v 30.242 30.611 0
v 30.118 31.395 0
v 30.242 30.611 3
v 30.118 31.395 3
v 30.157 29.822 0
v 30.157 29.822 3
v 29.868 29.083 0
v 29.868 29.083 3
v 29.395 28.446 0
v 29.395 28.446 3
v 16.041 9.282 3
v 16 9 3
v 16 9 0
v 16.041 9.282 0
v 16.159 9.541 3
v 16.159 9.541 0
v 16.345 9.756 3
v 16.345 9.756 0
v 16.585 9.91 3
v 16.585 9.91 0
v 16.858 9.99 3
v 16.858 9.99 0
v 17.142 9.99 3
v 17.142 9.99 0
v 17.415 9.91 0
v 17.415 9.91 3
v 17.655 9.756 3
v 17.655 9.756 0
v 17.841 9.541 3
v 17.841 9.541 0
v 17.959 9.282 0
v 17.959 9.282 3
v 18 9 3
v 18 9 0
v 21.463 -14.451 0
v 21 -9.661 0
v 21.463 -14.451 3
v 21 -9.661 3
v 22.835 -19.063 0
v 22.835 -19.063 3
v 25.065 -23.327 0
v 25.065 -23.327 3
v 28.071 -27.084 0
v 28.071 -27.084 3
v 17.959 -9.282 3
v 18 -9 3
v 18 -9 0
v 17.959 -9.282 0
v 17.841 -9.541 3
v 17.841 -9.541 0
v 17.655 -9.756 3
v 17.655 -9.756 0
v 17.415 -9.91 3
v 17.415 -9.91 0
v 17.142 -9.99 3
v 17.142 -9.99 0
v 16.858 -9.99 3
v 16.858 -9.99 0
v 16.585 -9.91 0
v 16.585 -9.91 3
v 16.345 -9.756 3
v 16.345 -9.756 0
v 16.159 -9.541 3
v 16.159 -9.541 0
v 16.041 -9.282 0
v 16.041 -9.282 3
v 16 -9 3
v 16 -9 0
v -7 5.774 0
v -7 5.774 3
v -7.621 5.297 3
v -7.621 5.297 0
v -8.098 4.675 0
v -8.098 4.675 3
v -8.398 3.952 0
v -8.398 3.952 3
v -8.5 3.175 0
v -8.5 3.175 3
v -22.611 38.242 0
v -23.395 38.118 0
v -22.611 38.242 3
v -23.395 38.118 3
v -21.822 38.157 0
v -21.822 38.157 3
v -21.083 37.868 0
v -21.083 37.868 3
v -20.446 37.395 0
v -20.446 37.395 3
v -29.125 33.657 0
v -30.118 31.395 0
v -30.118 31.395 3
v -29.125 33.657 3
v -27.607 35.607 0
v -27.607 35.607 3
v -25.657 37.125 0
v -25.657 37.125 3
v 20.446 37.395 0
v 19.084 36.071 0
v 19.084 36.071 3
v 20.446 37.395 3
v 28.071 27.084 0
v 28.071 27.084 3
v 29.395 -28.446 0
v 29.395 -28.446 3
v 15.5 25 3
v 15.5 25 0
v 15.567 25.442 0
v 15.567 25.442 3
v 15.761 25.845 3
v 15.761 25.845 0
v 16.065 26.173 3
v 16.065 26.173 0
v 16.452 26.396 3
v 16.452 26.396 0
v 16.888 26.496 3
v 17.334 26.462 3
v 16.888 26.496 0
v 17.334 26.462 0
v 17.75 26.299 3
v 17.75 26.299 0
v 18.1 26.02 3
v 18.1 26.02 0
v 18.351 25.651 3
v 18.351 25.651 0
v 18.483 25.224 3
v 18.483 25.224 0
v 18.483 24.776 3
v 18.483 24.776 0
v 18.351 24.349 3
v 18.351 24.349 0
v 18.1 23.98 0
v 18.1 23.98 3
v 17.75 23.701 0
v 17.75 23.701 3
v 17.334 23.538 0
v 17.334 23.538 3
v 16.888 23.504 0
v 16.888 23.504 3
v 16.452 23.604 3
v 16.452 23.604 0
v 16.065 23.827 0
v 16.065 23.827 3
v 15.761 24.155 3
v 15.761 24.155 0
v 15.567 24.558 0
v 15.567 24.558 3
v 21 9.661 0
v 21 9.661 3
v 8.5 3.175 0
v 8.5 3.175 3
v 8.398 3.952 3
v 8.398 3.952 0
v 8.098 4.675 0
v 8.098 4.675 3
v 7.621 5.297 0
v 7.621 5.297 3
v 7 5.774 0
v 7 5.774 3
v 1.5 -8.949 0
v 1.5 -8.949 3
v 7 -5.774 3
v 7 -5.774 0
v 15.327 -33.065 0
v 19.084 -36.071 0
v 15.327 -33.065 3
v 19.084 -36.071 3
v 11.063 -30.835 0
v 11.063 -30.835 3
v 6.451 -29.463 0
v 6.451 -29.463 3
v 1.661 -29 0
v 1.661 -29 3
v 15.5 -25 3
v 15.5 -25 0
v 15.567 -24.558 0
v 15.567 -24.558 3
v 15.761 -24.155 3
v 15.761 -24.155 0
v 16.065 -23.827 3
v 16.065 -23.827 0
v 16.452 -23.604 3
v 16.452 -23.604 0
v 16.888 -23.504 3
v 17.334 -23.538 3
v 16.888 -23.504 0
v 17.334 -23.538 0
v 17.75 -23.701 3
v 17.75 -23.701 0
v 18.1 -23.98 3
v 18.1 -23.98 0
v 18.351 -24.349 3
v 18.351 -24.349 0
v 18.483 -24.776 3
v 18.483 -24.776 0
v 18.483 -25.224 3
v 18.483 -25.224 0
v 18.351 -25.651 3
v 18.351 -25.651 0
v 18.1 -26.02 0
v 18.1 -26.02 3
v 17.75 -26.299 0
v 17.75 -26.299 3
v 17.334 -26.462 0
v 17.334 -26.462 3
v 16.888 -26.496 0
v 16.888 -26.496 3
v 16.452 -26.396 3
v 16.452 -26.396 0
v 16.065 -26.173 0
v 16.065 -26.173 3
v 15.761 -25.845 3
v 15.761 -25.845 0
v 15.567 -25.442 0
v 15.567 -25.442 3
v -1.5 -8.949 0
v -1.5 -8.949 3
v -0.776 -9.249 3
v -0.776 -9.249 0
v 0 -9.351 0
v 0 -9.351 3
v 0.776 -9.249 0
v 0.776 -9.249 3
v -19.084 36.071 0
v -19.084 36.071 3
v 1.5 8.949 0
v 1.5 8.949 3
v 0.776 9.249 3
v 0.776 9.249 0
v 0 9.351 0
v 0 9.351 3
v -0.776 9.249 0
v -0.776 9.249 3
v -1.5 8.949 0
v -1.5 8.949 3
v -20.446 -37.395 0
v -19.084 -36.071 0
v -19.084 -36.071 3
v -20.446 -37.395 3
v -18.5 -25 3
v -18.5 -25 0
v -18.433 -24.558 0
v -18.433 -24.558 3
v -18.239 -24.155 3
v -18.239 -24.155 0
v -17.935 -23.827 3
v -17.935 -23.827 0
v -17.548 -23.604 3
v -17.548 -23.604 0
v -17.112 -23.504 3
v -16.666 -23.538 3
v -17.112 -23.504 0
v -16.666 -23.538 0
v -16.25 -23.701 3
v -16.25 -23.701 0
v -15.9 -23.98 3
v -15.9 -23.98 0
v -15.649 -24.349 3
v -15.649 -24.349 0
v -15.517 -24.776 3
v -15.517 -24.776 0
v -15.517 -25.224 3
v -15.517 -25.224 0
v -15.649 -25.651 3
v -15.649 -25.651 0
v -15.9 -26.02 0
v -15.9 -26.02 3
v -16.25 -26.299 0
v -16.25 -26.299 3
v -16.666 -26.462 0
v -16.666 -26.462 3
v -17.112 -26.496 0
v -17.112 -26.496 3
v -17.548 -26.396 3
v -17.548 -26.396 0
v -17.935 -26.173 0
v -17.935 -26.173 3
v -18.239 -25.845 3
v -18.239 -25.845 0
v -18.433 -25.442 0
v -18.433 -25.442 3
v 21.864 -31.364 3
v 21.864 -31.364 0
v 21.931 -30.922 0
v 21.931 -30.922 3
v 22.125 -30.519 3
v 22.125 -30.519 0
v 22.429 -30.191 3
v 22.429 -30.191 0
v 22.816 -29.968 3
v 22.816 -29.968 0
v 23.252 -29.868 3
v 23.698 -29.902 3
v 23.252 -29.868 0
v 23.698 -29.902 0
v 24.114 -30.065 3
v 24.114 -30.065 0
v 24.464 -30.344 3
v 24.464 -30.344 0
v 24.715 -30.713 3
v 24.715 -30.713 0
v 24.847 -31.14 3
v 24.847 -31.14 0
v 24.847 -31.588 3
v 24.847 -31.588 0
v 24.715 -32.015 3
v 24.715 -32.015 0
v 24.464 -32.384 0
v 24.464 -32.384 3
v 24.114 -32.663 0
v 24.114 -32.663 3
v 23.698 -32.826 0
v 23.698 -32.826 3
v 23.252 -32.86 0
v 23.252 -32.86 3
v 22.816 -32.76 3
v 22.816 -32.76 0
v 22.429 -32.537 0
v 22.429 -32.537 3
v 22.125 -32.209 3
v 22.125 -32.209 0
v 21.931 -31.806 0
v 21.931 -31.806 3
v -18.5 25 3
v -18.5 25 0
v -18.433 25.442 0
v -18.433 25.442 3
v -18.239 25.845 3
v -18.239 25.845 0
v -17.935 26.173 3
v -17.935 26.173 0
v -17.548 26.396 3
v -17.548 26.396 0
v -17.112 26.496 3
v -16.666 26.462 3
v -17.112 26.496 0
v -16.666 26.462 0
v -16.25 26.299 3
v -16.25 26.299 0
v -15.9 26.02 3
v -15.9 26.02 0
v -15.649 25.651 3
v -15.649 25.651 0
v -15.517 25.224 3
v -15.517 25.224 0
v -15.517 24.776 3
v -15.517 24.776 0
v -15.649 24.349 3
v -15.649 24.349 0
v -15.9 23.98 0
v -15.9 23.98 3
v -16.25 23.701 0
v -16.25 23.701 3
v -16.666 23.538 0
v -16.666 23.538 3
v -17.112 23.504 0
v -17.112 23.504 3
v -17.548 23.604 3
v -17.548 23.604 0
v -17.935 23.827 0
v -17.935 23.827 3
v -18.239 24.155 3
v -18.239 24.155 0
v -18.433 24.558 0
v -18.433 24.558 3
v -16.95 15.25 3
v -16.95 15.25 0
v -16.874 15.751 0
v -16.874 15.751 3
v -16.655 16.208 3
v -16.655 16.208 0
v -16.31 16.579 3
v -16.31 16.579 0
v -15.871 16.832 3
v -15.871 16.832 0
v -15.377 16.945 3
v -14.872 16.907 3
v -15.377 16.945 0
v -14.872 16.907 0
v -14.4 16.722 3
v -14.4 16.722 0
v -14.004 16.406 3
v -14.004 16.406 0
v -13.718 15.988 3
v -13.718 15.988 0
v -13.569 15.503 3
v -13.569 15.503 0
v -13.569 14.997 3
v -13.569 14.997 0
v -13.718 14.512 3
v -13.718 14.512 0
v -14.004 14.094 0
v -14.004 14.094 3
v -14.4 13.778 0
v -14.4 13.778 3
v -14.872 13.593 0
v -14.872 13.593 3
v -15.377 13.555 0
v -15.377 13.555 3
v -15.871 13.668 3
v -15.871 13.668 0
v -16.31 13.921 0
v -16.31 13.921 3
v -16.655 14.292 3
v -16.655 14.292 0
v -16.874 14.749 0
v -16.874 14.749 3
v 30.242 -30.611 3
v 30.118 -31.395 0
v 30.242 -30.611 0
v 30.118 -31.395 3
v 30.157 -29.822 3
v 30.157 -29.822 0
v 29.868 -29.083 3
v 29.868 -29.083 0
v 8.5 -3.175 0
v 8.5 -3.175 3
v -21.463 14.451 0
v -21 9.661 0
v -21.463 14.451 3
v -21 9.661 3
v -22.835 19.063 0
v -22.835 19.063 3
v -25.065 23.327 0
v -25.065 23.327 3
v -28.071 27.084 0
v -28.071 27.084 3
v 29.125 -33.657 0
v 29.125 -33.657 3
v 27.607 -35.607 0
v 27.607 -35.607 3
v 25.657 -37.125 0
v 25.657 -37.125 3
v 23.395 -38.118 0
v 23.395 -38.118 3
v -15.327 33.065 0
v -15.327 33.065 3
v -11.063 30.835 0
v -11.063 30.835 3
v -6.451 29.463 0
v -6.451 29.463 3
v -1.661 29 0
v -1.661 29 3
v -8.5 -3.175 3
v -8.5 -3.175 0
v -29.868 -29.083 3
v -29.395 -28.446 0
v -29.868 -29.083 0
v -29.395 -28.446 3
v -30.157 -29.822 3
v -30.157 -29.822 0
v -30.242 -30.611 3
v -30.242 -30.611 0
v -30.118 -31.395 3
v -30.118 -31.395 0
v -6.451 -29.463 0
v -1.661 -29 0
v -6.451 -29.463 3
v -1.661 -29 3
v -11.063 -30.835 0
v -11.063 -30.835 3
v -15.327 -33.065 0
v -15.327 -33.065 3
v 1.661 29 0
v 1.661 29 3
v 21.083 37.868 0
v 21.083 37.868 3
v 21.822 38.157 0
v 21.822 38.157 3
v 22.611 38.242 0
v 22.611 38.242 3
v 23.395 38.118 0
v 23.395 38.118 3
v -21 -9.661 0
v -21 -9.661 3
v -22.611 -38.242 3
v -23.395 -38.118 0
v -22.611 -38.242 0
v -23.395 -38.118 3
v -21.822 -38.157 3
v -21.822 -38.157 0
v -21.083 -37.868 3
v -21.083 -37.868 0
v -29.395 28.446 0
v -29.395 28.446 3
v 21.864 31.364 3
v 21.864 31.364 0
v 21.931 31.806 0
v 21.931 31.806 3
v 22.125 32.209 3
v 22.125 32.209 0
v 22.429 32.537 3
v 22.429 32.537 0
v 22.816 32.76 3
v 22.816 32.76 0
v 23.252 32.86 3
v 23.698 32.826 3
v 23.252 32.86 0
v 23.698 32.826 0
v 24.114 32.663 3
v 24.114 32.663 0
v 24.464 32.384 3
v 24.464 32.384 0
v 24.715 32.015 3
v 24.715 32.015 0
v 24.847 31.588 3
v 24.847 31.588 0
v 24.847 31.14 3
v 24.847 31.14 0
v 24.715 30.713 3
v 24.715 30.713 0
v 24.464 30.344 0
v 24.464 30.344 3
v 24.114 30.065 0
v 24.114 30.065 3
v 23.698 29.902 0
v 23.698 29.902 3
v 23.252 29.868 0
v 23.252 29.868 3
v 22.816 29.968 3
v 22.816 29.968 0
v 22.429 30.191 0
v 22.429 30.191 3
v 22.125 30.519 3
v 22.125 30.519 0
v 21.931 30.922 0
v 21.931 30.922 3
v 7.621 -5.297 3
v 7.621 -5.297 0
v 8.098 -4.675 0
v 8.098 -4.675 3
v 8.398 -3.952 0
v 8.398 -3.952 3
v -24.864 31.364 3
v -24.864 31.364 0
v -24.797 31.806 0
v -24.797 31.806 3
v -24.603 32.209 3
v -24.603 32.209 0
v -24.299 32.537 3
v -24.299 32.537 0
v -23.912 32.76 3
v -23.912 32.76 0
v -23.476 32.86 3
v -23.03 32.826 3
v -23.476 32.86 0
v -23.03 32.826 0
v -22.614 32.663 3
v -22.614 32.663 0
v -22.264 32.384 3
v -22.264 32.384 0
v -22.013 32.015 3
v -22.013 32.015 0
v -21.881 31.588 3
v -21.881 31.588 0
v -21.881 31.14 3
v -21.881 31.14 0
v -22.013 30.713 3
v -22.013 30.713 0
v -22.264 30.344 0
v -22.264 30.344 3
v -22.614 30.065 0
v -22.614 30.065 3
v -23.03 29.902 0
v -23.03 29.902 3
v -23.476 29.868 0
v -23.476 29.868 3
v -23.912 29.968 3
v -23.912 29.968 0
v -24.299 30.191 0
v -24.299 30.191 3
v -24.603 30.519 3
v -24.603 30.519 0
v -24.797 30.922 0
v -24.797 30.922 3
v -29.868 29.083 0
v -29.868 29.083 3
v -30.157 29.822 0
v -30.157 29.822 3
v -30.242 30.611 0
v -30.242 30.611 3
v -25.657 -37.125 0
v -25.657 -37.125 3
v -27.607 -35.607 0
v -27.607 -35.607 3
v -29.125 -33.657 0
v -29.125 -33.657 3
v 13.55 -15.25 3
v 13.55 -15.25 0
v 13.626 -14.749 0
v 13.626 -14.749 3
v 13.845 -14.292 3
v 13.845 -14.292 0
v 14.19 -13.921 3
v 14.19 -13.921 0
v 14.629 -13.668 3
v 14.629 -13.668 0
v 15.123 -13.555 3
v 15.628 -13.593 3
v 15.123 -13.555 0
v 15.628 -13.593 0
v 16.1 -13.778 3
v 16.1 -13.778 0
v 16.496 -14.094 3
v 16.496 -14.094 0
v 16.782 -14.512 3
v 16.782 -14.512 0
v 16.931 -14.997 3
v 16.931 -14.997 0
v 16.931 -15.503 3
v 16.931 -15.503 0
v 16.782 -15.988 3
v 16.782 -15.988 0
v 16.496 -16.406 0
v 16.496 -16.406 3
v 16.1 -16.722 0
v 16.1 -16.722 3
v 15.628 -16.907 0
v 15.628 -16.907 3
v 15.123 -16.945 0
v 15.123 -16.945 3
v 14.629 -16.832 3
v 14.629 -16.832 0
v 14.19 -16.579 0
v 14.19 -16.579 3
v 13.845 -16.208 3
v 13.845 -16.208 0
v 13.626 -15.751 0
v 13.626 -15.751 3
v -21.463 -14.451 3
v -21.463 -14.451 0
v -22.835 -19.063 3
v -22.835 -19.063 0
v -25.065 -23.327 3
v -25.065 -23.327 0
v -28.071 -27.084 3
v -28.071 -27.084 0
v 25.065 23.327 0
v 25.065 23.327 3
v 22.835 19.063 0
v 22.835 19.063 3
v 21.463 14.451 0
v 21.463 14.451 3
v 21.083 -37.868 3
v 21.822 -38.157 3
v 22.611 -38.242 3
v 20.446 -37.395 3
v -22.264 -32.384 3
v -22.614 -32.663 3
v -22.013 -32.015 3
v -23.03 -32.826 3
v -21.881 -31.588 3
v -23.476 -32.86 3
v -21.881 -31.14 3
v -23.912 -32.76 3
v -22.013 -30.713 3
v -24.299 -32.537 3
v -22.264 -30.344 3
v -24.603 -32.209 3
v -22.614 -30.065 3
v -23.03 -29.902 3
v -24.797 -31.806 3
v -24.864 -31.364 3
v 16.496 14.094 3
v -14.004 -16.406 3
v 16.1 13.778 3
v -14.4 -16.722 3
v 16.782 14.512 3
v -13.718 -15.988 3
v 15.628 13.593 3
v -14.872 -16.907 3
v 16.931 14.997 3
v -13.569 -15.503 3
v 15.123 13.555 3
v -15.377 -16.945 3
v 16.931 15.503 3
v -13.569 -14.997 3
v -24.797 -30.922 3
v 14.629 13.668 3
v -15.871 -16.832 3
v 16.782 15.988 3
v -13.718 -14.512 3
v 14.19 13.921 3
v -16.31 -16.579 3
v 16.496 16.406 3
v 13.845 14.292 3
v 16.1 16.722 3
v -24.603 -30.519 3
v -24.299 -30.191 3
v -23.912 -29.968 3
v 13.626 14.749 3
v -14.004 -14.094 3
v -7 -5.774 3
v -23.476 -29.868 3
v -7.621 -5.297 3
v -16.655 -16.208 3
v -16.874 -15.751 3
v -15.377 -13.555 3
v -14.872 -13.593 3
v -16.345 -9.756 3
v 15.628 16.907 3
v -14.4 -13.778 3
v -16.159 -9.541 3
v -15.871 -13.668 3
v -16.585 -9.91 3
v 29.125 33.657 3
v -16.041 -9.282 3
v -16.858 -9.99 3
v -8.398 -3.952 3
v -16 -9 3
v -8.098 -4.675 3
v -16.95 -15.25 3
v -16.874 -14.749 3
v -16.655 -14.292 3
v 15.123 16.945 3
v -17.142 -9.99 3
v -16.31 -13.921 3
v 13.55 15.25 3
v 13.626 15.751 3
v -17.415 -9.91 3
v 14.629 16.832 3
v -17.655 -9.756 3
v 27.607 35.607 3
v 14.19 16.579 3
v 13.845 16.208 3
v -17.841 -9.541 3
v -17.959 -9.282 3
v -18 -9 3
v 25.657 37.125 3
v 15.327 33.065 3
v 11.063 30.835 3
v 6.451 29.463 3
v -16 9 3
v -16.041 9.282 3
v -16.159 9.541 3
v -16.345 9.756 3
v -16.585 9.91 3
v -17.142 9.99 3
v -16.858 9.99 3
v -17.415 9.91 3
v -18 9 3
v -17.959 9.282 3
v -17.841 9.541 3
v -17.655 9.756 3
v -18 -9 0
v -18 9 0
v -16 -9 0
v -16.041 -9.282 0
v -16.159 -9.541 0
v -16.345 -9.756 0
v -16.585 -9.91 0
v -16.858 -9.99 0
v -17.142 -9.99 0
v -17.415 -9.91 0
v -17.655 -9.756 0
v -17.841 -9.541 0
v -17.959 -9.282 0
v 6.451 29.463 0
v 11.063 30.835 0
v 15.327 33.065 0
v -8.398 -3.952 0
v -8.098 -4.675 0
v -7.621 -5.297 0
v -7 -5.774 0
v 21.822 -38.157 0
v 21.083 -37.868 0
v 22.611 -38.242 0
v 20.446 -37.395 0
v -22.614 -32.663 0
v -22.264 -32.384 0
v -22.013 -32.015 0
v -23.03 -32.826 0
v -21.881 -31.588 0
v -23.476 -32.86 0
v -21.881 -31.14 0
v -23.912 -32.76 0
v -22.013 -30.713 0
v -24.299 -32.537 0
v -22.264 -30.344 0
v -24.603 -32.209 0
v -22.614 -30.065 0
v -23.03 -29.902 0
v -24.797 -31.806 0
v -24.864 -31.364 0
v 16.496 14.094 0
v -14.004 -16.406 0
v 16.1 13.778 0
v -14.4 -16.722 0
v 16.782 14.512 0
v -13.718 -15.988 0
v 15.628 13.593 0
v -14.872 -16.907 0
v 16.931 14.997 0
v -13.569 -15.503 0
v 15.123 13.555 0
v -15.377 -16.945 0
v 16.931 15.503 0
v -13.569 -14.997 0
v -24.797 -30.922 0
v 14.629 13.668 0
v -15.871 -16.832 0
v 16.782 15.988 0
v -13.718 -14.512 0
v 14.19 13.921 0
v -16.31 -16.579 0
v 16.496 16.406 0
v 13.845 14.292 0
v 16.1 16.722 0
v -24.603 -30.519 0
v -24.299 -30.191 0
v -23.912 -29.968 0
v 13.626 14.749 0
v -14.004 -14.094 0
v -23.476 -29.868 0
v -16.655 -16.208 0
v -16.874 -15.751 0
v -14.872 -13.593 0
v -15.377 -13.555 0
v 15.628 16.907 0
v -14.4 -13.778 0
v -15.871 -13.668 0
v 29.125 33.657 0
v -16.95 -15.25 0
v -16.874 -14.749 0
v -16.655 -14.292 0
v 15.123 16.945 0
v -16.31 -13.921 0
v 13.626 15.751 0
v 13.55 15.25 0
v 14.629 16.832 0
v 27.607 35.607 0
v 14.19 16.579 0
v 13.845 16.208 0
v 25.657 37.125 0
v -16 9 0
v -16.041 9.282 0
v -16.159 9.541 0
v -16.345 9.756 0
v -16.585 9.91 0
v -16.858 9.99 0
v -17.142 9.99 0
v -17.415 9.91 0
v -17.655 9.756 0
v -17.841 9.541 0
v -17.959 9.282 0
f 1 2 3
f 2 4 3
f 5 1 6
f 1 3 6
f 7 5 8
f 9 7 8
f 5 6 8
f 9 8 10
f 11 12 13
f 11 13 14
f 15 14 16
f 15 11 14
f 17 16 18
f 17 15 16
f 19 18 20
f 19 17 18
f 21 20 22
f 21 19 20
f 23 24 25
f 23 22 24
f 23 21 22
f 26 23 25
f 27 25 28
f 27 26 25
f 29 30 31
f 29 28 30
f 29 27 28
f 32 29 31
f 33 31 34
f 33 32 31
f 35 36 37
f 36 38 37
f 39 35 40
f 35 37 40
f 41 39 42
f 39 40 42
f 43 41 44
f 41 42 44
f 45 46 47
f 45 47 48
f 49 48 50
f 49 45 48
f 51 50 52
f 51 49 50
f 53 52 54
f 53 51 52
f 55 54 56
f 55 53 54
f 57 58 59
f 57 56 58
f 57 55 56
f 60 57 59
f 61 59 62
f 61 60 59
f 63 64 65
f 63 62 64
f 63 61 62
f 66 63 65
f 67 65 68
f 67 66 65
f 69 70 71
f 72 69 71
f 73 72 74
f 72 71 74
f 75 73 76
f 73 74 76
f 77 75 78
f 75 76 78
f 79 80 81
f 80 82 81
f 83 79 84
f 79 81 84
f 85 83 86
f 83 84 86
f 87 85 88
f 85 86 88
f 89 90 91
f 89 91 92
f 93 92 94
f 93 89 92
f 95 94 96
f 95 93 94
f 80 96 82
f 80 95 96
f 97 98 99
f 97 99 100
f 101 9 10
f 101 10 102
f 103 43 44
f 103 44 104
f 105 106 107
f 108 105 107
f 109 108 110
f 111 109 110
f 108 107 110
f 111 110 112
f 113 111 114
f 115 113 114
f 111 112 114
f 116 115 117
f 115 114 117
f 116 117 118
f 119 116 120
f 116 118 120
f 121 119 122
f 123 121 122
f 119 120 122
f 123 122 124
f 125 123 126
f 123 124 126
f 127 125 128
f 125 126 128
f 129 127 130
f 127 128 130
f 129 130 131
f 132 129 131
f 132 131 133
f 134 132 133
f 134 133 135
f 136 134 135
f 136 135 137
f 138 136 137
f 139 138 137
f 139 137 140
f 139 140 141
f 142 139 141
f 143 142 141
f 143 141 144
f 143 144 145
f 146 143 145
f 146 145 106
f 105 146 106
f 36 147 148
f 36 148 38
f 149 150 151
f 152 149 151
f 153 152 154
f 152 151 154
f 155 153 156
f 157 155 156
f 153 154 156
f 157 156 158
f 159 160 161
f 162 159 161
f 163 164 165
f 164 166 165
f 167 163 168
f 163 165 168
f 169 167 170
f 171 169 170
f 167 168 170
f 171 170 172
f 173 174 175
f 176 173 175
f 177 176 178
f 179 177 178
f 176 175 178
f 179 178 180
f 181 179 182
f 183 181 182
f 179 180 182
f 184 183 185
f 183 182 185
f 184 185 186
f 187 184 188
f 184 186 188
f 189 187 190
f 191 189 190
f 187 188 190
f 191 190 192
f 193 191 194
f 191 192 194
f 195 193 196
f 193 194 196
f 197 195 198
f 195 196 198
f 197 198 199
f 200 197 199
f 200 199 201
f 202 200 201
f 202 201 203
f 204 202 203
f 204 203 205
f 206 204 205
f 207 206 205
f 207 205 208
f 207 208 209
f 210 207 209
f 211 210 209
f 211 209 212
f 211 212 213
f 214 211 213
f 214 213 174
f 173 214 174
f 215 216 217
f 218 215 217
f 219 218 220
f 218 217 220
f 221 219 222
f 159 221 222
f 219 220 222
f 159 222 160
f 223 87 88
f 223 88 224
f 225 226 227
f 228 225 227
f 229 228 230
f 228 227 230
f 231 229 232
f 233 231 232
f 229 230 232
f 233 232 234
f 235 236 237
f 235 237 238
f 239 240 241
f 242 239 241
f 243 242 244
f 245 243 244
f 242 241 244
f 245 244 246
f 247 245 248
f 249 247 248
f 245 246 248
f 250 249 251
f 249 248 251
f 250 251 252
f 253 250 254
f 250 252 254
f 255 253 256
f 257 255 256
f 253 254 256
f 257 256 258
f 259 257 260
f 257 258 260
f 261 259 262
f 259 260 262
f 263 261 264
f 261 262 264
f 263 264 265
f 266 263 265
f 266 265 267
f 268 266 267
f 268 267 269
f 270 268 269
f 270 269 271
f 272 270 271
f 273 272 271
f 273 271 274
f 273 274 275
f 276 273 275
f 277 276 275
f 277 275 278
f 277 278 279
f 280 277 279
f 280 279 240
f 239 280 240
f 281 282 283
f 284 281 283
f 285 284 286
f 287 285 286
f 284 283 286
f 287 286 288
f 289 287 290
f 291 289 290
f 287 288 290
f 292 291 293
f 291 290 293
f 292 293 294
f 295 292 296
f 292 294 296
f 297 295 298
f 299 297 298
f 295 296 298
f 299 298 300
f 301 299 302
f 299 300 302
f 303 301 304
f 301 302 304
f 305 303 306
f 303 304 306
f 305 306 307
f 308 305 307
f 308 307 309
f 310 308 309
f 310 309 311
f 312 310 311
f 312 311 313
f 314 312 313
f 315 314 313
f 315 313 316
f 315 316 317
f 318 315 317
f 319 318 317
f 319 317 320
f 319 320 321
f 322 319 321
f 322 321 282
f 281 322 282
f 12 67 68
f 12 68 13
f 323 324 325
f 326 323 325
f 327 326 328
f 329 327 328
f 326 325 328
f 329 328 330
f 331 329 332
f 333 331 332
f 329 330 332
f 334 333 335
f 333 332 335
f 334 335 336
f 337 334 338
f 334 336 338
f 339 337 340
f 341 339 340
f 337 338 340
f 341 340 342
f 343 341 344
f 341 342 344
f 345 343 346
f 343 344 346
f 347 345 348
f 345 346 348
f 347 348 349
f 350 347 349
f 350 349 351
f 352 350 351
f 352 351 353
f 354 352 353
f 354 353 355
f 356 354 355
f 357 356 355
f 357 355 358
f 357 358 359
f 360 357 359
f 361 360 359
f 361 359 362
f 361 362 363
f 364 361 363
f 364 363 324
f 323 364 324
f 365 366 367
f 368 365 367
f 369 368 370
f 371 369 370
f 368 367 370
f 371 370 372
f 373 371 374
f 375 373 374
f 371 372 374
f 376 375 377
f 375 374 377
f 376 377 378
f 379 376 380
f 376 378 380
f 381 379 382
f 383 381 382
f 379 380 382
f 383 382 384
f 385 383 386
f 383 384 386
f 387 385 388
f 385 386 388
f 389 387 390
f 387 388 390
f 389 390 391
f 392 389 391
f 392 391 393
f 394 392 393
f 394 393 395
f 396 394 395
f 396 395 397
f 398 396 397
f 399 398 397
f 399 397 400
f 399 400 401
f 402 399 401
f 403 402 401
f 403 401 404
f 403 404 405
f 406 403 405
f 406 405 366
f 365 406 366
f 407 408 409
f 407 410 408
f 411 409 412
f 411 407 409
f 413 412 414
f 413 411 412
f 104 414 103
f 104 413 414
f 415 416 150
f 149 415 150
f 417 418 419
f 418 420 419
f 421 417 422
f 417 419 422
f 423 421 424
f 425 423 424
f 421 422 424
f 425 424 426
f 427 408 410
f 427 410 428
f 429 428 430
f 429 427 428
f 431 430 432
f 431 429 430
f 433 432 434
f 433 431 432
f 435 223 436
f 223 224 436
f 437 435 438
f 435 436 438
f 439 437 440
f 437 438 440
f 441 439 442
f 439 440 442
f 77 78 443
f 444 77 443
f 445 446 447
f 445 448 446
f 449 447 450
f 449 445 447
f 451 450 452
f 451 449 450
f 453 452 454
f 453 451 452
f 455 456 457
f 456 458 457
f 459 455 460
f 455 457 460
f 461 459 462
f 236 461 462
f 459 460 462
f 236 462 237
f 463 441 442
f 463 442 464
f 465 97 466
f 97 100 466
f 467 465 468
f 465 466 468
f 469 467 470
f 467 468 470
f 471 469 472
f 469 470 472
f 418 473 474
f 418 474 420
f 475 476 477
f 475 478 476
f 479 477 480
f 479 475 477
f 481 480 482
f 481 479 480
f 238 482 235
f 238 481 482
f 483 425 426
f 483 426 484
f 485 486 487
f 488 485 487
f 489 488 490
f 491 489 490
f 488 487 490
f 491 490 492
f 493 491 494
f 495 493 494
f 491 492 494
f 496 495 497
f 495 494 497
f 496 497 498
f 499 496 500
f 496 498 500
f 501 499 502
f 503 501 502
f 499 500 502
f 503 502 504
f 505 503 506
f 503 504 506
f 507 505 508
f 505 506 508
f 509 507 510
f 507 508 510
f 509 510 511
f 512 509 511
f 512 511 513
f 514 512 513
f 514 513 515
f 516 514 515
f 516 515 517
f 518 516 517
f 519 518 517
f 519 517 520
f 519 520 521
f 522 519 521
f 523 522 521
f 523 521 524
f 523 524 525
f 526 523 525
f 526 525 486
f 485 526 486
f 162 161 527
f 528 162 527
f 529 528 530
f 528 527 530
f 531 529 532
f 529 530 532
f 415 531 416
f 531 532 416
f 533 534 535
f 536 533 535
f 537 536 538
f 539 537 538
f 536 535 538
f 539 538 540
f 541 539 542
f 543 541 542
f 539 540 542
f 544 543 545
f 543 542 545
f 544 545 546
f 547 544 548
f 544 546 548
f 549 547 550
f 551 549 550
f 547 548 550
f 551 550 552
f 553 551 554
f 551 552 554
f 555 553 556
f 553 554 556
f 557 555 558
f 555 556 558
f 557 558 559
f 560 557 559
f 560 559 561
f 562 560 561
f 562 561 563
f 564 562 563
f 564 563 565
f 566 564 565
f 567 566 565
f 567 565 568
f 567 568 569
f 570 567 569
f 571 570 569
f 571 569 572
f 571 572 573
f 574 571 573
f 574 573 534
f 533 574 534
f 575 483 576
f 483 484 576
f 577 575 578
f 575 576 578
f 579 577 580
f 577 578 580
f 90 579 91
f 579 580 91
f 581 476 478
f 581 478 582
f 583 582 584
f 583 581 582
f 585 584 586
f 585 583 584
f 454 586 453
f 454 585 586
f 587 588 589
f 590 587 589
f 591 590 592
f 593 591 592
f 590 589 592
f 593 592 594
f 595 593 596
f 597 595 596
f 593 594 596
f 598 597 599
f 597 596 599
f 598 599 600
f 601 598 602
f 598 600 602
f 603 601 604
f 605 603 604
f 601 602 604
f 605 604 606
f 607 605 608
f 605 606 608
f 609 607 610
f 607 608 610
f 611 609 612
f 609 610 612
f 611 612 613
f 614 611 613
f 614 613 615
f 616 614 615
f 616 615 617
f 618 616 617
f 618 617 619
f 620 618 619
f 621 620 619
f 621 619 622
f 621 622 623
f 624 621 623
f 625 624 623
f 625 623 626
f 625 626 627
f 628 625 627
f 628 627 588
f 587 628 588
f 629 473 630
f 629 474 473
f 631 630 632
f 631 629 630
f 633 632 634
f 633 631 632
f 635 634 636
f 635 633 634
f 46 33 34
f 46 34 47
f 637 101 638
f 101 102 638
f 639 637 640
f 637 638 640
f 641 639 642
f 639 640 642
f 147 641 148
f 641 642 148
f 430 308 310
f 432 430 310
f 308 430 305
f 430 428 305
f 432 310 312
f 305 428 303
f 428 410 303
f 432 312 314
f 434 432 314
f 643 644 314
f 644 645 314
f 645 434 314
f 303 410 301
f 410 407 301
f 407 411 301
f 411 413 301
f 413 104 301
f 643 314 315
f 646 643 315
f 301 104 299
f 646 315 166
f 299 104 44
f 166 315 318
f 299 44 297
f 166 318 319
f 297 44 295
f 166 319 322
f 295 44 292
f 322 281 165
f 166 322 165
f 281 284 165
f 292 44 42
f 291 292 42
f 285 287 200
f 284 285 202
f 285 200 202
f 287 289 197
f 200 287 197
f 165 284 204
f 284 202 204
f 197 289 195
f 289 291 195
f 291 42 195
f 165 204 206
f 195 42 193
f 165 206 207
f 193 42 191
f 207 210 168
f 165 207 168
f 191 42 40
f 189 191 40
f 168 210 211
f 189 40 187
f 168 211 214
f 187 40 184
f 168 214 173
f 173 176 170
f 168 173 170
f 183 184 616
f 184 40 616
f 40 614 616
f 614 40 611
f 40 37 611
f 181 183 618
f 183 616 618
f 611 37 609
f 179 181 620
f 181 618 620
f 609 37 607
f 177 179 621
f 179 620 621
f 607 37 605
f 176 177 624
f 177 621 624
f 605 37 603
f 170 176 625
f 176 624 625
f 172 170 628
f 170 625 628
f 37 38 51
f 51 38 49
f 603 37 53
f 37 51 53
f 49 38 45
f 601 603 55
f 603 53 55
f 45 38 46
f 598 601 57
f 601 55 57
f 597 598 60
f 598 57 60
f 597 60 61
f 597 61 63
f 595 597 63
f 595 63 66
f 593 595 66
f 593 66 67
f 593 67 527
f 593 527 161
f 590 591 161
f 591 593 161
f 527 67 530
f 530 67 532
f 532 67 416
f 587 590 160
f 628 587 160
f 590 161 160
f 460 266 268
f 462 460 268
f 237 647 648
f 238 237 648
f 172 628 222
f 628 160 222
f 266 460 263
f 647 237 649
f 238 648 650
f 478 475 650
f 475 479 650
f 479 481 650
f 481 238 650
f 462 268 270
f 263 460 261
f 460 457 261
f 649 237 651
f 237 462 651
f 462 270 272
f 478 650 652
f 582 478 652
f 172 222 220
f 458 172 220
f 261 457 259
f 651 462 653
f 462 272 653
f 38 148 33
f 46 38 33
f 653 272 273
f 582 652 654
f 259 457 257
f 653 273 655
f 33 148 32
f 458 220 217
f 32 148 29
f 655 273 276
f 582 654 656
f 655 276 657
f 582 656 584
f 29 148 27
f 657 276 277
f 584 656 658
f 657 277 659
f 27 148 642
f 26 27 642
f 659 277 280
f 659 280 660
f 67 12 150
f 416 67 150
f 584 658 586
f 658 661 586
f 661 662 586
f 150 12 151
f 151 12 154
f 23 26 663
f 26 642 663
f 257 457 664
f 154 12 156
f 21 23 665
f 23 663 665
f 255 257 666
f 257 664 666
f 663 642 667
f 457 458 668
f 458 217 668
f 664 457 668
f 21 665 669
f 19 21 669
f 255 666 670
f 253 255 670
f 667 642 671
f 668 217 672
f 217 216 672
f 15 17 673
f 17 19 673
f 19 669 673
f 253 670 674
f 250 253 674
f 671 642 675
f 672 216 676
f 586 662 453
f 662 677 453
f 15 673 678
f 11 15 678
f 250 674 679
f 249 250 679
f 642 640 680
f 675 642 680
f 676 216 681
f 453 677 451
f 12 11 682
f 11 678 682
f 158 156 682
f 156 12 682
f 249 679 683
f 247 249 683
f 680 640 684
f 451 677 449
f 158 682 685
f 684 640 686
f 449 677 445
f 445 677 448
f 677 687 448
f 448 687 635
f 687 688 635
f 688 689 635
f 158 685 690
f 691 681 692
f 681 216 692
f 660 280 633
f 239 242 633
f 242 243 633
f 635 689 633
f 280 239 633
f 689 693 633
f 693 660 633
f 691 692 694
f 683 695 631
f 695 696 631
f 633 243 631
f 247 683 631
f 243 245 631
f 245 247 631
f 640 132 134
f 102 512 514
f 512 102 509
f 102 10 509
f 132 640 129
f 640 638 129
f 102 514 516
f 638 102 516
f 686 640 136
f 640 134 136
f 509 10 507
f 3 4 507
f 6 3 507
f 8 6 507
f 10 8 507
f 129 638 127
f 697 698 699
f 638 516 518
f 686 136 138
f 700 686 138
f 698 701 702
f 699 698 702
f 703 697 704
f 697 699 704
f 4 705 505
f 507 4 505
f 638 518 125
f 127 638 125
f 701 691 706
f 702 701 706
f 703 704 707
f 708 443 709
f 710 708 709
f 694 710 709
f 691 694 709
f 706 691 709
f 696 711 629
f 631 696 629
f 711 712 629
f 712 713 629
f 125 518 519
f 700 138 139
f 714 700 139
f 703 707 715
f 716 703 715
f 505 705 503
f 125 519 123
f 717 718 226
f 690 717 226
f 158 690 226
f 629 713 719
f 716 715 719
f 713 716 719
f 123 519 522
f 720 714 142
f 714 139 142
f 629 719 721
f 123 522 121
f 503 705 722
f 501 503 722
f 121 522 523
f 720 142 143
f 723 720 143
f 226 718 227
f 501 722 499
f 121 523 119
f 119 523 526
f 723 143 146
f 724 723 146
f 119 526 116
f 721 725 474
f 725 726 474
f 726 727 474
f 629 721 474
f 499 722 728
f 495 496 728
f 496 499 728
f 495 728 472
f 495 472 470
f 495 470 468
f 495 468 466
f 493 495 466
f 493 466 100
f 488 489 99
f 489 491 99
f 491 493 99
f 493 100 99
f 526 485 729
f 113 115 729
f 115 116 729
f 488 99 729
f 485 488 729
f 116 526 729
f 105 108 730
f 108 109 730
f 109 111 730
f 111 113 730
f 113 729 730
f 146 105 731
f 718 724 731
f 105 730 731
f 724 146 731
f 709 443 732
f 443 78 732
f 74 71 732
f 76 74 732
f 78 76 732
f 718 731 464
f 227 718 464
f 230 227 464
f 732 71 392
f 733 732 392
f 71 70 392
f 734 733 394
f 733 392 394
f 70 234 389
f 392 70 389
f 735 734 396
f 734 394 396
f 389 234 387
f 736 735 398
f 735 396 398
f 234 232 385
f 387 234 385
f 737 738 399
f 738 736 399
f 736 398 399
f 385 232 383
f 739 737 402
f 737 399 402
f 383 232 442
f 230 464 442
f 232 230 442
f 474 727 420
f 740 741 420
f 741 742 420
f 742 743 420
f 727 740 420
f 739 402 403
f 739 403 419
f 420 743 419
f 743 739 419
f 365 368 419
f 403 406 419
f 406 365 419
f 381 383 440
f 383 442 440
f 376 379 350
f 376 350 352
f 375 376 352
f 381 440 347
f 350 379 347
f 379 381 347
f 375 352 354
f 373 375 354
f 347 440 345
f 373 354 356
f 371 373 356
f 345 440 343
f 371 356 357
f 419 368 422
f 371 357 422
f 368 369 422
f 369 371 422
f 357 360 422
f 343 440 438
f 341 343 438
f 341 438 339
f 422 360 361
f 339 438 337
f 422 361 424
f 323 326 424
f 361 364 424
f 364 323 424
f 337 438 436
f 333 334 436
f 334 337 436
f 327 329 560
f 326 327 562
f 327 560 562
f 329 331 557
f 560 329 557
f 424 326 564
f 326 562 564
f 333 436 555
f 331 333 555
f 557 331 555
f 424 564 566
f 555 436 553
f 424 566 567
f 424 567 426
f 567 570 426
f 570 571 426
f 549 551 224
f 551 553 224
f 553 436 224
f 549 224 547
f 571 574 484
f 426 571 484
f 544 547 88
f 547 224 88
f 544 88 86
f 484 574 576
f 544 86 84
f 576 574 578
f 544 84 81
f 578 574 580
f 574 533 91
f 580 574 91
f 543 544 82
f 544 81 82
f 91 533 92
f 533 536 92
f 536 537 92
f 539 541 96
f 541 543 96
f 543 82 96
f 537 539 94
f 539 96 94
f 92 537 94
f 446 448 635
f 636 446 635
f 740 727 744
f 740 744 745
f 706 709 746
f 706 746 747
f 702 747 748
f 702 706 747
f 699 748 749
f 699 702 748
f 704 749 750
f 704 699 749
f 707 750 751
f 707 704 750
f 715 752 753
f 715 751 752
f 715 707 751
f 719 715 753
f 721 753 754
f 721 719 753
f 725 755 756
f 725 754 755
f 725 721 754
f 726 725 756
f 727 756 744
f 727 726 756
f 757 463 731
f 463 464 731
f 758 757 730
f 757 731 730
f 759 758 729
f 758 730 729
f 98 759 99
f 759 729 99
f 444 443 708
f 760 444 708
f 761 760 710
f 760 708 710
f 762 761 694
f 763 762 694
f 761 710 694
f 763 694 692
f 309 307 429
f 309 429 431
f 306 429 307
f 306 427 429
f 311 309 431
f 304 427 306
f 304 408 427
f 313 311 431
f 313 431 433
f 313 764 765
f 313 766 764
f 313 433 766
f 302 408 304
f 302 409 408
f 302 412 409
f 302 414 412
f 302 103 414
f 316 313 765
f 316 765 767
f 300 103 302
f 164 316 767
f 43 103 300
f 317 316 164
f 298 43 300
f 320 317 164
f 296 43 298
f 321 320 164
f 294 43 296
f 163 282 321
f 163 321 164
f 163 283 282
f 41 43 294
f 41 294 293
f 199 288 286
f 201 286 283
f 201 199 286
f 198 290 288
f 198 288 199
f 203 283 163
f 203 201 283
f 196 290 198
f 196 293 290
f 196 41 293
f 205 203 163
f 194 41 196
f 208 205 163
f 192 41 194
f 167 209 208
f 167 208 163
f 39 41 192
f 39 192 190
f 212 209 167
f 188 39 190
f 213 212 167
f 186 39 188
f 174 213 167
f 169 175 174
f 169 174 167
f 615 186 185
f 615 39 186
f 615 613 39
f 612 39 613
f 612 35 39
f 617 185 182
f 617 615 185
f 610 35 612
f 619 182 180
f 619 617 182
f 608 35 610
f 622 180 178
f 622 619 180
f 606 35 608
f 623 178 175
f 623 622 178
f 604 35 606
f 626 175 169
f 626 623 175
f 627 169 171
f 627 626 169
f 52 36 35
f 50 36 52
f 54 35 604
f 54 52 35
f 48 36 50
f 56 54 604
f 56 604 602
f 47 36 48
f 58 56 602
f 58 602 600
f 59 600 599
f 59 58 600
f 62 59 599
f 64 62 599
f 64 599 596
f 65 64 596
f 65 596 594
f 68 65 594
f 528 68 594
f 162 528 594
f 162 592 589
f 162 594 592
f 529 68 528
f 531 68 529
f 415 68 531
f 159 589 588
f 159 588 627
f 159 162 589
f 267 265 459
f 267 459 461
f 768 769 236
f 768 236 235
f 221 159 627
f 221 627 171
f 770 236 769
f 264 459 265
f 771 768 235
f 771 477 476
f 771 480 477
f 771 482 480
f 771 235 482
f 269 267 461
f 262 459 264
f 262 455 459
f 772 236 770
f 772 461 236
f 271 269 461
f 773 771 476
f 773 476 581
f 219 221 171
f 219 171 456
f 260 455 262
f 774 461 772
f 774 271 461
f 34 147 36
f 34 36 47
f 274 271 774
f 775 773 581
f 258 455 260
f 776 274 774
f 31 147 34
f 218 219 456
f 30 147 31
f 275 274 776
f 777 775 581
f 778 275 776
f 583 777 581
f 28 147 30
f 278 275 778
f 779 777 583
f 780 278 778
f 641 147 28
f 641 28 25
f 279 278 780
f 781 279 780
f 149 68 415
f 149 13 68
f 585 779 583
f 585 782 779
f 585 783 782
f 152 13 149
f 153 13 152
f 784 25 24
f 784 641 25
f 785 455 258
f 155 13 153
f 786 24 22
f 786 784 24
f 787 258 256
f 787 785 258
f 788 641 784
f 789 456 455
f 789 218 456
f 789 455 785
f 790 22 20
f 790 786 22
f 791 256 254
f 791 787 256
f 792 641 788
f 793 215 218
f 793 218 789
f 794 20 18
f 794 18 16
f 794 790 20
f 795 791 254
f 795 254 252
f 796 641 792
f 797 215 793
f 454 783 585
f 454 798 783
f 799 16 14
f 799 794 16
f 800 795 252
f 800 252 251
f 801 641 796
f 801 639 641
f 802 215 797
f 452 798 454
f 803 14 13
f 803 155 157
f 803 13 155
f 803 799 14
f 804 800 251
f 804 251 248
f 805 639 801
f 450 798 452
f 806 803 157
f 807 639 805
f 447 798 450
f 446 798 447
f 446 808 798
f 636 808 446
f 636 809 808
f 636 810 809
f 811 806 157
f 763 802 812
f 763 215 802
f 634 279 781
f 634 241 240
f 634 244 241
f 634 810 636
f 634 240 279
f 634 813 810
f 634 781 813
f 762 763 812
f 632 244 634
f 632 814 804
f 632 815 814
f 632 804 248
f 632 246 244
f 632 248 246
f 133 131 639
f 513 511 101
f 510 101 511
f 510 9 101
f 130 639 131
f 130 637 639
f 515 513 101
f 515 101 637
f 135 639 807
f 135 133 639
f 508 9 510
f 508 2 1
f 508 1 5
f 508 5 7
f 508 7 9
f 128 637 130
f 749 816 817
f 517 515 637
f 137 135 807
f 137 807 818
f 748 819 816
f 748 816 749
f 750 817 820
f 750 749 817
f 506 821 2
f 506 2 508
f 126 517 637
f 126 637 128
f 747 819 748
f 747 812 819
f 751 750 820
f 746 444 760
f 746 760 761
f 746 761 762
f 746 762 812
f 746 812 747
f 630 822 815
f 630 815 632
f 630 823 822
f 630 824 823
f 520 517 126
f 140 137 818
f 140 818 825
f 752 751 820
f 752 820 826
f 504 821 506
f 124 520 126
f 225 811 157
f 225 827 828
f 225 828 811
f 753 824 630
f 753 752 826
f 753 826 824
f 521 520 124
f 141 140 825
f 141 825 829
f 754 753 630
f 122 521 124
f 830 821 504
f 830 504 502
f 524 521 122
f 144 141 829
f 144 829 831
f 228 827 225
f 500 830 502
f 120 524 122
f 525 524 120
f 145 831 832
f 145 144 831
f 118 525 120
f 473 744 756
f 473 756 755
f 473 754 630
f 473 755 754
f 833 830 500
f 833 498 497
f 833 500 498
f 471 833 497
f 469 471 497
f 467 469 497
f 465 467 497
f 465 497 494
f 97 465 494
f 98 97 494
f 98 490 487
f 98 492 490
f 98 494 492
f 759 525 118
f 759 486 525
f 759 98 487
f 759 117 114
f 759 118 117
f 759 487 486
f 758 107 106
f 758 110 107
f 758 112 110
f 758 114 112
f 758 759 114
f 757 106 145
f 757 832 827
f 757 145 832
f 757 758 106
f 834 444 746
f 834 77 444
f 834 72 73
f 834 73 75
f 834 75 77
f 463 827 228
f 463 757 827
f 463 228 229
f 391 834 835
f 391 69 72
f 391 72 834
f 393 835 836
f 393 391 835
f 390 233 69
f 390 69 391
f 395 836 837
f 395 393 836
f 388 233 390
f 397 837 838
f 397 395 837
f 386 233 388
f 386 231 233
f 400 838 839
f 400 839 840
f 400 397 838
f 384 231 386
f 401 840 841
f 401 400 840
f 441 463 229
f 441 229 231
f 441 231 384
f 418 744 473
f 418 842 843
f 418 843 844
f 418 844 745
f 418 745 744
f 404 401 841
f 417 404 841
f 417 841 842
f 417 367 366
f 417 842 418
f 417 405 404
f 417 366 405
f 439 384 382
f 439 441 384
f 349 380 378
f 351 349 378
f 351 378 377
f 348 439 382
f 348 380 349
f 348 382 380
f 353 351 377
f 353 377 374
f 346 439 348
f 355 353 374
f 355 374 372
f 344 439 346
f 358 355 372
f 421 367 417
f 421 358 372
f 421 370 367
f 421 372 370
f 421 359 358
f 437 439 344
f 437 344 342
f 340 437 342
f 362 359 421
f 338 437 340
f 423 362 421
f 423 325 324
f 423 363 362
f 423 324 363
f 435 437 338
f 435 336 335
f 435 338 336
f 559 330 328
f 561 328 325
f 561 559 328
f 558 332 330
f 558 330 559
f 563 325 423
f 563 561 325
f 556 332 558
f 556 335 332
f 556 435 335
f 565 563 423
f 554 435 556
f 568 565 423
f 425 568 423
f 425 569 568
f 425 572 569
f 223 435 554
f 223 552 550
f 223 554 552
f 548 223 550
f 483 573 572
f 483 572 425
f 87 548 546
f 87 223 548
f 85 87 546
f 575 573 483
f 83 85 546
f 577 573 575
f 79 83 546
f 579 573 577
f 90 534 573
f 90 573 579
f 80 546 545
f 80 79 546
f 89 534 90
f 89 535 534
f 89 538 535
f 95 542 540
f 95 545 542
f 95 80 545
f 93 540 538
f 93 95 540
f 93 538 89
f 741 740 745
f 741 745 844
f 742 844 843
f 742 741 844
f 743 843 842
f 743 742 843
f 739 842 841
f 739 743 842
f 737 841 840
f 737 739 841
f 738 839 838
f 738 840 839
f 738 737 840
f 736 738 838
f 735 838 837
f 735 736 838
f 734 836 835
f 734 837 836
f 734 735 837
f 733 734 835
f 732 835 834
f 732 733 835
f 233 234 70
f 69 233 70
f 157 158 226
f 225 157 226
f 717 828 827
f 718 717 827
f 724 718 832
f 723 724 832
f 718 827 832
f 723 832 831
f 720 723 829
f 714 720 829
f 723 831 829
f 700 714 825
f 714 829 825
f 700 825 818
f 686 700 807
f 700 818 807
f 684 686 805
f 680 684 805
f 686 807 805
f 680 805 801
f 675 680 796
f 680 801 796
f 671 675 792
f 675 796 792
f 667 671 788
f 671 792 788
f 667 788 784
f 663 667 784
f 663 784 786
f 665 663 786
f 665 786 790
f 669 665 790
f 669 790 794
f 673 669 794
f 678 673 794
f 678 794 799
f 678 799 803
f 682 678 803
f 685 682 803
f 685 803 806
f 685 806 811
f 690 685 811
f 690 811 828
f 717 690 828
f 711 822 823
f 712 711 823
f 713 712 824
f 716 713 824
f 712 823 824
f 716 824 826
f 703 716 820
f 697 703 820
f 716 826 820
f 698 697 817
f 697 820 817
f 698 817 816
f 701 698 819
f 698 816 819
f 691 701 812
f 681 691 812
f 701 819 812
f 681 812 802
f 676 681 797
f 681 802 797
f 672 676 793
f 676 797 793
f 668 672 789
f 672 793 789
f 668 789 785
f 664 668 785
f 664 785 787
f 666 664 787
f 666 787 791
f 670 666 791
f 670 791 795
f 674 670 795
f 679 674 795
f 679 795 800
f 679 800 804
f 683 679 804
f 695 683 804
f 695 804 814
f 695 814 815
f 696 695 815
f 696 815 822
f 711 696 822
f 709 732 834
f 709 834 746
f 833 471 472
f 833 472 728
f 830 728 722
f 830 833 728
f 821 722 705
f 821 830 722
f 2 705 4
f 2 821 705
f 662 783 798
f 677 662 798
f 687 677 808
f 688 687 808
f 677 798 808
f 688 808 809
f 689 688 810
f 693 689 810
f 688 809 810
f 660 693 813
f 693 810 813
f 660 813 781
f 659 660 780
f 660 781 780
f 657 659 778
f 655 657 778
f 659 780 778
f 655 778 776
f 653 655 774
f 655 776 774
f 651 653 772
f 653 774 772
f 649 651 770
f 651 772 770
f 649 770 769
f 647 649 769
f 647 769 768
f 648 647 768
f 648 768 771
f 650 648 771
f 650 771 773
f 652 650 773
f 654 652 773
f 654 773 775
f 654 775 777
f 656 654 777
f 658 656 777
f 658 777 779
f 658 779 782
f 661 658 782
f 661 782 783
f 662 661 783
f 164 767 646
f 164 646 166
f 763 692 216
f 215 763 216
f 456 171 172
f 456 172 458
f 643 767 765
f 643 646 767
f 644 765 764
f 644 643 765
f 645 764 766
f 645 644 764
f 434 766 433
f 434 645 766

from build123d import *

# Parameters (mm, degrees)
AUFSATZ_LINEAR_AUSTRAGEN1_DEPTH = 3
VERRUNDUNG1_R                   = 25
VERRUNDUNG2_R                   = 3
SKIZZE3_R                       = 8.5
SCHNITT_LINEAR_AUSTRAGEN1_DEPTH = 49.848849018
SCHNITT_LINEAR_AUSTRAGEN4_DEPTH = 4
SKIZZE4_R                       = 1.5
SKIZZE4_R_2                     = 1.7
SCHNITT_LINEAR_AUSTRAGEN2_DEPTH = 49.848849018
SCHNITT_LINEAR_AUSTRAGEN3_DEPTH = 49.848849018


with BuildPart() as part:
    # Skizze2 → Aufsatz-Linear austragen1 (new body)
    with BuildSketch(Plane.XY):
        with BuildLine():
            Line((-21, -19.807611845), (-21, 19.807611845))
            Line((-21, 19.807611845), (-30.482365961, 29.565355279))
            ThreePointArc((-30.482365961, 29.565355279), (-27.606601718, 35.606601718), (-21.565355279, 38.482365961))
            Line((-21.565355279, 38.482365961), (-11.807611845, 29))
            Line((-11.807611845, 29), (11.807611845, 29))
            Line((11.807611845, 29), (21.565355279, 38.482365961))
            ThreePointArc((21.565355279, 38.482365961), (27.606601718, 35.606601718), (30.482365961, 29.565355279))
            Line((30.482365961, 29.565355279), (21, 19.807611845))
            Line((21, 19.807611845), (21, -19.807611845))
            Line((21, -19.807611845), (30.482365961, -29.565355279))
            ThreePointArc((30.482365961, -29.565355279), (27.606601718, -35.606601718), (21.565355279, -38.482365961))
            Line((21.565355279, -38.482365961), (11.807611845, -29))
            Line((11.807611845, -29), (-11.807611845, -29))
            Line((-11.807611845, -29), (-21.565355279, -38.482365961))
            ThreePointArc((-21.565355279, -38.482365961), (-27.606601718, -35.606601718), (-30.482365961, -29.565355279))
            Line((-30.482365961, -29.565355279), (-21, -19.807611845))
        make_face()
    extrude(amount=AUFSATZ_LINEAR_AUSTRAGEN1_DEPTH)

    # Verrundung1
    verrundung1_edges = [part.edges().sort_by_distance(p)[0] for p in [
        (-21, -19.807611845, 1.5),
        (-21, 19.807611845, 1.5),
        (-11.807611845, 29, 1.5),
        (11.807611845, 29, 1.5),
        (21, 19.807611845, 1.5),
        (21, -19.807611845, 1.5),
        (11.807611845, -29, 1.5),
        (-11.807611845, -29, 1.5),
    ]]
    fillet(verrundung1_edges, radius=VERRUNDUNG1_R)

    # Verrundung2
    verrundung2_edges = [part.edges().sort_by_distance(p)[0] for p in [
        (-30.482365961, 29.565355279, 1.5),
        (-21.565355279, 38.482365961, 1.5),
        (21.565355279, 38.482365961, 1.5),
        (30.482365961, 29.565355279, 1.5),
        (30.482365961, -29.565355279, 1.5),
        (21.565355279, -38.482365961, 1.5),
        (-21.565355279, -38.482365961, 1.5),
        (-30.482365961, -29.565355279, 1.5),
    ]]
    fillet(verrundung2_edges, radius=VERRUNDUNG2_R)

    # Skizze3 → Schnitt-Linear austragen1 (cut, through all)
    with BuildSketch(Plane(origin=(0, 0, 0), x_dir=(-1, 0, 0), z_dir=(0, 0, -1))):
        Circle(SKIZZE3_R)
    extrude(amount=-SCHNITT_LINEAR_AUSTRAGEN1_DEPTH, mode=Mode.SUBTRACT)

    # Skizze7 → Schnitt-Linear austragen4 (cut)
    with BuildSketch(Plane.XY.offset(3)):
        with BuildLine():
            Line((-1.5, 8.948929172), (-7, 5.773502692))
            ThreePointArc((-7, 5.773502692), (-8.098076211, 4.675426481), (-8.5, 3.175426481))
            Line((-8.5, 3.175426481), (-8.5, -3.175426481))
            ThreePointArc((-8.5, -3.175426481), (-8.098076211, -4.675426481), (-7, -5.773502692))
            Line((-7, -5.773502692), (-1.5, -8.948929172))
            ThreePointArc((-1.5, -8.948929172), (0, -9.350852961), (1.5, -8.948929172))
            Line((1.5, -8.948929172), (7, -5.773502692))
            ThreePointArc((7, -5.773502692), (8.098076211, -4.675426481), (8.5, -3.175426481))
            Line((8.5, -3.175426481), (8.5, 3.175426481))
            ThreePointArc((8.5, 3.175426481), (8.098076211, 4.675426481), (7, 5.773502692))
            Line((7, 5.773502692), (1.5, 8.948929172))
            ThreePointArc((1.5, 8.948929172), (0, 9.350852961), (-1.5, 8.948929172))
        make_face()
    extrude(amount=-SCHNITT_LINEAR_AUSTRAGEN4_DEPTH, mode=Mode.SUBTRACT)

    # Skizze4 → Schnitt-Linear austragen2 (cut, through all)
    with BuildSketch(Plane(origin=(0, 0, 0), x_dir=(-1, 0, 0), z_dir=(0, 0, -1))):
        with Locations((-23.363961031, 31.363961031)):
            Circle(SKIZZE4_R)
        with Locations((-17, 25)):
            Circle(SKIZZE4_R)
        with Locations((-15.25, 15.25)):
            Circle(SKIZZE4_R_2)
        with Locations((-17, -25)):
            Circle(SKIZZE4_R)
        with Locations((-15.25, -15.25)):
            Circle(SKIZZE4_R_2)
        with Locations((-23.363961031, -31.363961031)):
            Circle(SKIZZE4_R)
        with Locations((23.363961031, -31.363961031)):
            Circle(SKIZZE4_R)
        with Locations((17, -25)):
            Circle(SKIZZE4_R)
        with Locations((15.25, -15.25)):
            Circle(SKIZZE4_R_2)
        with Locations((23.363961031, 31.363961031)):
            Circle(SKIZZE4_R)
        with Locations((17, 25)):
            Circle(SKIZZE4_R)
        with Locations((15.25, 15.25)):
            Circle(SKIZZE4_R_2)
    extrude(amount=-SCHNITT_LINEAR_AUSTRAGEN2_DEPTH, mode=Mode.SUBTRACT)

    # Skizze5 → Schnitt-Linear austragen3 (cut, through all)
    with BuildSketch(Plane.XY.offset(3)):
        with BuildLine():
            Line((18, 9), (18, -9))
            ThreePointArc((18, -9), (17, -10), (16, -9))
            Line((16, -9), (16, 9))
            ThreePointArc((16, 9), (17, 10), (18, 9))
        make_face()
        with BuildLine():
            Line((-16, 9), (-16, -9))
            ThreePointArc((-16, -9), (-17, -10), (-18, -9))
            Line((-18, -9), (-18, 9))
            ThreePointArc((-18, 9), (-17, 10), (-16, 9))
        make_face()
    extrude(amount=-SCHNITT_LINEAR_AUSTRAGEN3_DEPTH, mode=Mode.SUBTRACT)


solid = part.part
